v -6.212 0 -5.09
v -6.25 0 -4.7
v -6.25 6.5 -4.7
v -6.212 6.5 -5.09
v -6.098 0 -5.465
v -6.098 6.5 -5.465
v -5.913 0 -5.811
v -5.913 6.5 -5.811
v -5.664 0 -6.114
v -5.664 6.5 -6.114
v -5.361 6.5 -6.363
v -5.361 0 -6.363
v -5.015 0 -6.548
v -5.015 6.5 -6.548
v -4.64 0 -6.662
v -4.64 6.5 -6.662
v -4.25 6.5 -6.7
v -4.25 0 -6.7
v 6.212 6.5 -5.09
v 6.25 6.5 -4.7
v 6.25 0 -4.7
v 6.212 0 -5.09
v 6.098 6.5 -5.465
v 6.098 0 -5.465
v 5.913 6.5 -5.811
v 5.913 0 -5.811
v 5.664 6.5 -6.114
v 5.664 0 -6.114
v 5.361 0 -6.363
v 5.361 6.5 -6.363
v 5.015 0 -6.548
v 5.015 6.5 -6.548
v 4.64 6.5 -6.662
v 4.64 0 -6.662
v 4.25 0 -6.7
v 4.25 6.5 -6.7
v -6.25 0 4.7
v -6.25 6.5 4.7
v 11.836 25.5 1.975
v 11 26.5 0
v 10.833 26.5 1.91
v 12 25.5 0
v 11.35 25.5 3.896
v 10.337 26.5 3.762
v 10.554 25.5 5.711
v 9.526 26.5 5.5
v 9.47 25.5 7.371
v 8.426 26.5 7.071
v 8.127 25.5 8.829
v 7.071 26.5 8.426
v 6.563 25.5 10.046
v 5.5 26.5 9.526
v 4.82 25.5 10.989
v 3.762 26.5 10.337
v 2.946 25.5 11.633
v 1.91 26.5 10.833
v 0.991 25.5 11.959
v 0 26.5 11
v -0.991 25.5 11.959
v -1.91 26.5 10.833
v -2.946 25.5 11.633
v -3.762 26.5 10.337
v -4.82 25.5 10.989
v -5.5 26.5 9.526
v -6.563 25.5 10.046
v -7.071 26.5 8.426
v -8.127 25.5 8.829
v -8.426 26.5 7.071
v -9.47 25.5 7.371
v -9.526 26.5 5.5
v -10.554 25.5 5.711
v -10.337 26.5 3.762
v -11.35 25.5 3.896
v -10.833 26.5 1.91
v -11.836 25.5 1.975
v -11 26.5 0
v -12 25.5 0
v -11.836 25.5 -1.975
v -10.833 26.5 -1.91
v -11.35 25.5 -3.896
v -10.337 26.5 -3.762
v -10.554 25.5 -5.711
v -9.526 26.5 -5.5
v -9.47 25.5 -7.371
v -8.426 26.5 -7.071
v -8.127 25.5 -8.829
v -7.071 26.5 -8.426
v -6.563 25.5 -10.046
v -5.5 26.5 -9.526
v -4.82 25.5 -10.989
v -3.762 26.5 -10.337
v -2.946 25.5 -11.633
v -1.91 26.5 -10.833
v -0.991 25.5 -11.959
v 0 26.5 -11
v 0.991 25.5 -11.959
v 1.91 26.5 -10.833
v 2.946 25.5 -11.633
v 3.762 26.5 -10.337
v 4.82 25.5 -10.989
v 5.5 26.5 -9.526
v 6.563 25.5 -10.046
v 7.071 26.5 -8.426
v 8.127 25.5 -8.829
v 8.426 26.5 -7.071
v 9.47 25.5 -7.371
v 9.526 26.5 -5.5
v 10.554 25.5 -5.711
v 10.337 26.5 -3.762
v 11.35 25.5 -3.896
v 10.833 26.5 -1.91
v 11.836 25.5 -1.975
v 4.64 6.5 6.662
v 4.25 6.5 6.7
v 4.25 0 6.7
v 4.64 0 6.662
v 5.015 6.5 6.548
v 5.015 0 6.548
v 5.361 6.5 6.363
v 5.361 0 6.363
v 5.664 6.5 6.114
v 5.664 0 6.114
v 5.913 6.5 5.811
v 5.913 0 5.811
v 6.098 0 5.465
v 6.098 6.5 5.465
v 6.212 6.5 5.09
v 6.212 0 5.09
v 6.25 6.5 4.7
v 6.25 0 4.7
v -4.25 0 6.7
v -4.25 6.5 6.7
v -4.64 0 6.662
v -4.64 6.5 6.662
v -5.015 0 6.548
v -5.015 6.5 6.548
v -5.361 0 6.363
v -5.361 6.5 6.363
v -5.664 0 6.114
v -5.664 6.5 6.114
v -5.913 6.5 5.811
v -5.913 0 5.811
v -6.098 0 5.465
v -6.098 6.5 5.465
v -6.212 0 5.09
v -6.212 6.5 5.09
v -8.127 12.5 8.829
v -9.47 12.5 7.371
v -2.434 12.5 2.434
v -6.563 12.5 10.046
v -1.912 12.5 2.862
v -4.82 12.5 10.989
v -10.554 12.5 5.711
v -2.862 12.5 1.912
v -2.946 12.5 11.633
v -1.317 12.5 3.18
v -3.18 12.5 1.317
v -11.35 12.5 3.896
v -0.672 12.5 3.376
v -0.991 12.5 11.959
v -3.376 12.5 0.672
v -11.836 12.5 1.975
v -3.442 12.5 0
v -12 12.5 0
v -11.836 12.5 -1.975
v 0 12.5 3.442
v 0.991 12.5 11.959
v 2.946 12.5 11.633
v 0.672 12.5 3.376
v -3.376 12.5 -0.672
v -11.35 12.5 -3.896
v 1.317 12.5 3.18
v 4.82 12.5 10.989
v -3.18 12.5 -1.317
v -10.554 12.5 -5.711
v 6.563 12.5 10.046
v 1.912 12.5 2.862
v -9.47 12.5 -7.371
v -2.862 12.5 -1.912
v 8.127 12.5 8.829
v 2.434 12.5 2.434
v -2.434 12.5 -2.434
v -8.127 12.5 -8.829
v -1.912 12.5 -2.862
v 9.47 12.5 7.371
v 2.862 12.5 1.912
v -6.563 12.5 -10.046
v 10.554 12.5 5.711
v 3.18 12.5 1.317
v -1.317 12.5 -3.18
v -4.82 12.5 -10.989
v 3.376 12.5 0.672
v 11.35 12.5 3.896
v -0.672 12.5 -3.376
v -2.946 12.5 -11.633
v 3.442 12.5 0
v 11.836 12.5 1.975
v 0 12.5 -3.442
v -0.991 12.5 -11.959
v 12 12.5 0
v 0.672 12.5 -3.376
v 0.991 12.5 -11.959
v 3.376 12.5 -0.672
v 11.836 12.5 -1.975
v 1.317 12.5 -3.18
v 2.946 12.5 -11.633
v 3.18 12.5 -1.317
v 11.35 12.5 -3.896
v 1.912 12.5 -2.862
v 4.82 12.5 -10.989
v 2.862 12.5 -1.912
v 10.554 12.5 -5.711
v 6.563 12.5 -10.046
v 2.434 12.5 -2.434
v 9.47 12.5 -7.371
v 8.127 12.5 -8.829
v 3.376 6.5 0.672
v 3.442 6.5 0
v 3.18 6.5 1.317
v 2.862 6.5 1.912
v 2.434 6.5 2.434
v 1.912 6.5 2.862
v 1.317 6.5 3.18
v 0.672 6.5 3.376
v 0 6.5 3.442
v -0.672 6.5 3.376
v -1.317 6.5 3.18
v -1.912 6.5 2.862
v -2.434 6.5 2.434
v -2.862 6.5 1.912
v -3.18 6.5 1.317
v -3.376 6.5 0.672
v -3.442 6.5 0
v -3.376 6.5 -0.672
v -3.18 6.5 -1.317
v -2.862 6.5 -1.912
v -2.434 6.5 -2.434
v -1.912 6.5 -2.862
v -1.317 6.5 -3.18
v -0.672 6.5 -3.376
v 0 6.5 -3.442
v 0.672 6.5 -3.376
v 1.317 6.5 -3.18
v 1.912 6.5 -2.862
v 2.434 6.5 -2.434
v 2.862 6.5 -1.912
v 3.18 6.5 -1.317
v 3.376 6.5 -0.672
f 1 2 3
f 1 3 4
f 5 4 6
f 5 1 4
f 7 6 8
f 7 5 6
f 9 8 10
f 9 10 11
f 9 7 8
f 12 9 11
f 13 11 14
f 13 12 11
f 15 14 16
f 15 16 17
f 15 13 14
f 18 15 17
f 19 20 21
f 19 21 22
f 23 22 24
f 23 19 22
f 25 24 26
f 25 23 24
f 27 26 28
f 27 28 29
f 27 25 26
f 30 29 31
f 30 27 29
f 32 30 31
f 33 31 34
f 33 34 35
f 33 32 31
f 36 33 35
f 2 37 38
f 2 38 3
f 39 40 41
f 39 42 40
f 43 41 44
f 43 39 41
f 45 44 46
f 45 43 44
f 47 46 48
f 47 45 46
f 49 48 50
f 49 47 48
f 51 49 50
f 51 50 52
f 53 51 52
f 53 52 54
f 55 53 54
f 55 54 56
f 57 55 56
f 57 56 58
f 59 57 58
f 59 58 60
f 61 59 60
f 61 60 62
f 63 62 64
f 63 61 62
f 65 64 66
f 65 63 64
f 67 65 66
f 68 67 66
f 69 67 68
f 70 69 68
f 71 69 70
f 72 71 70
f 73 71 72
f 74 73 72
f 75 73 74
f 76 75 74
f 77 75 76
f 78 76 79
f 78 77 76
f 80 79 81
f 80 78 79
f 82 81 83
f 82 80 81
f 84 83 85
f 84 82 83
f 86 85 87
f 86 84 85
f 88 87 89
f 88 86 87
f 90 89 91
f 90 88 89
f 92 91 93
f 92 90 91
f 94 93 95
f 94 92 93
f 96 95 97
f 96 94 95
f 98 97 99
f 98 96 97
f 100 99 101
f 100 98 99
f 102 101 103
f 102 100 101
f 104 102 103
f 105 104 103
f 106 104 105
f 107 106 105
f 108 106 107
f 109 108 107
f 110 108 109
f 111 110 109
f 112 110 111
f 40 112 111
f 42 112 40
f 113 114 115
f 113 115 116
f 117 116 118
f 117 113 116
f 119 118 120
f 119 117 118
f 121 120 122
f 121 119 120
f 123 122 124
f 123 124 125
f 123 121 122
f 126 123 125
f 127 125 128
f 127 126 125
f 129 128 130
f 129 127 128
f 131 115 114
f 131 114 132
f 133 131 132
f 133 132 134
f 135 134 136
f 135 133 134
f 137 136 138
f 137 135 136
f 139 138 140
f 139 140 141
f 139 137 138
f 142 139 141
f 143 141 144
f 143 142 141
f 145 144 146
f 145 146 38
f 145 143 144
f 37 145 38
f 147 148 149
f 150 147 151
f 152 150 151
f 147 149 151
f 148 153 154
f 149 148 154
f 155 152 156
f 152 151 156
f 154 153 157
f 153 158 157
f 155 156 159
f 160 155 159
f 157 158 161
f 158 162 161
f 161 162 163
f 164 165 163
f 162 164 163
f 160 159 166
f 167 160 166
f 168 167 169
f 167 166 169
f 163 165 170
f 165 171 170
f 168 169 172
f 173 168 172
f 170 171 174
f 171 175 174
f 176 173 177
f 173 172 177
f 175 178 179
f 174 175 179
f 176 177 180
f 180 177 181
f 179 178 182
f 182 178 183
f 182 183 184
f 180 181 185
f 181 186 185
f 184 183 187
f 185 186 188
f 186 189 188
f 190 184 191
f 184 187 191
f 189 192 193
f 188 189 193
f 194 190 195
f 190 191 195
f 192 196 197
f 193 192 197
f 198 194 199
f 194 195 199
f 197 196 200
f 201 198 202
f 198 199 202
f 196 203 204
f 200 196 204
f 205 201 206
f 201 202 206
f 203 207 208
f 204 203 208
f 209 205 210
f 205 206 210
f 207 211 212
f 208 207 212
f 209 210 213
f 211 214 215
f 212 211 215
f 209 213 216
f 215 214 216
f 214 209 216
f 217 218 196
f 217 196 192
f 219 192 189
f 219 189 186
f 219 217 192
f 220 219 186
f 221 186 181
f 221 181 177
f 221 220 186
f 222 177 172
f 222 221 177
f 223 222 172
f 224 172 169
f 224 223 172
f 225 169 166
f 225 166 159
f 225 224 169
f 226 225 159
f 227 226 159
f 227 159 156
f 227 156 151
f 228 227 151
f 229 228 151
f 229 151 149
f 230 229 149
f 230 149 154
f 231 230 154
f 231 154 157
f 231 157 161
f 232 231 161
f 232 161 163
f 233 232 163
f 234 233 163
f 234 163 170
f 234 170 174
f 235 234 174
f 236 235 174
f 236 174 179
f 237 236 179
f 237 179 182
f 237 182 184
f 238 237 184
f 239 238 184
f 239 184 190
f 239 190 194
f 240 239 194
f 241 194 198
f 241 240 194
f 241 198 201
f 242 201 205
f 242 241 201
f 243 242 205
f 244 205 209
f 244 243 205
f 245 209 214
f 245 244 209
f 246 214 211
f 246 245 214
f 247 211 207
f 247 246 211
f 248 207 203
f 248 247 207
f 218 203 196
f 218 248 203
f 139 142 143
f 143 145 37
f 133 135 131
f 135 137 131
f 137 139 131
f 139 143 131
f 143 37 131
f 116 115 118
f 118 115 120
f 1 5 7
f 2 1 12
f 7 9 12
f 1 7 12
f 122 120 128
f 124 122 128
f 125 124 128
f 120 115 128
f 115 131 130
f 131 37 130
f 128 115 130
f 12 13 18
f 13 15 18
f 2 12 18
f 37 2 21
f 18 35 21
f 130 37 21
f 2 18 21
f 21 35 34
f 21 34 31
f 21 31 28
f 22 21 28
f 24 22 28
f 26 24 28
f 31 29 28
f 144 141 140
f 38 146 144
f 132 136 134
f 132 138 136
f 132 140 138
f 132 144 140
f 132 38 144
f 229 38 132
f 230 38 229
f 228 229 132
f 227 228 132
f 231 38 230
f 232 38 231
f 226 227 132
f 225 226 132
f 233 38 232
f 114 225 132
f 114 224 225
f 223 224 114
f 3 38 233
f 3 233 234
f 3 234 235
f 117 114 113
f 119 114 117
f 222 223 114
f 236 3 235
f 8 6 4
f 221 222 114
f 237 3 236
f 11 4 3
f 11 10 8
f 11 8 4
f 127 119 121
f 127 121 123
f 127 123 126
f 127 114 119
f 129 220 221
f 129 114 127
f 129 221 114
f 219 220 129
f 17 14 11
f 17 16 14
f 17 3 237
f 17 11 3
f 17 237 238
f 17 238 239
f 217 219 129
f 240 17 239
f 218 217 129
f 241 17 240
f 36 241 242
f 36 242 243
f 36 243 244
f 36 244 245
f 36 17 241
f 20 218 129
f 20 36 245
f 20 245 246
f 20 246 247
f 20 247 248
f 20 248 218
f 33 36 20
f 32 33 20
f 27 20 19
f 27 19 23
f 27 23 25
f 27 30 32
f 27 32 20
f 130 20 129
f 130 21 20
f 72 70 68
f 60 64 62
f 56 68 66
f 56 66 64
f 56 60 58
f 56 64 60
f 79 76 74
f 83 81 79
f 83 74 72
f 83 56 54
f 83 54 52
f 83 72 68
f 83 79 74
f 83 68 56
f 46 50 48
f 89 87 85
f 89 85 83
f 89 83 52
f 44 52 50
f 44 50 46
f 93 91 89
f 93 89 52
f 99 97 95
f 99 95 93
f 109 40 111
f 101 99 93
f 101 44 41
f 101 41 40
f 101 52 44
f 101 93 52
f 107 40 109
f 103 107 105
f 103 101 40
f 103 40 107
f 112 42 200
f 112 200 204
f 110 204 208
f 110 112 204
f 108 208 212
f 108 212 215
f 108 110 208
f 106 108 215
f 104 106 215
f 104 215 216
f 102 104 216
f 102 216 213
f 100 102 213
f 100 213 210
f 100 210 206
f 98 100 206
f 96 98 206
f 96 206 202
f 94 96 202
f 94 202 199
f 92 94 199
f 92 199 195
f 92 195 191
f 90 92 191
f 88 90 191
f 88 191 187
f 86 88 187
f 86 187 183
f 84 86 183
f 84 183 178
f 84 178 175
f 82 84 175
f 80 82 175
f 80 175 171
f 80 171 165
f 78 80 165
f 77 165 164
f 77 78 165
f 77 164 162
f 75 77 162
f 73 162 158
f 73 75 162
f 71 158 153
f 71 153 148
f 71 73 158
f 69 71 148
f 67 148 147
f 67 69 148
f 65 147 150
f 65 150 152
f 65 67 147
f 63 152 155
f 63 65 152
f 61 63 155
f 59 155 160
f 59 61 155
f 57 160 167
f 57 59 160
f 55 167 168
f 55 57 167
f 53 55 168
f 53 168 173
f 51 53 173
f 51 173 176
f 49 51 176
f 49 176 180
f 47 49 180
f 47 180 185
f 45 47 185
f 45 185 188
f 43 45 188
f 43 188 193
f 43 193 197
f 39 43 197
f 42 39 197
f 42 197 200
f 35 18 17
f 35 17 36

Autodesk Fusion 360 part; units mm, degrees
sketch "Sketch1" plane through (0, 0, 0) normal (0, 1, 0) x (1, 0, 0)
  line L0 (6.25, -6.7) -> (-6.25, -6.7)
  line L1 (-6.25, -6.7) -> (-6.25, 6.7)
  line L2 (-6.25, 6.7) -> (6.25, 6.7)
  line L3 (6.25, 6.7) -> (6.25, -6.7)
  line L4 (6.25, -6.7) -> (-6.25, 6.7) construction
  line L5 (-6.25, -6.7) -> (6.25, 6.7) construction
  circle A0 centre (0, 0) radius 3
  circle A1 centre (0, 0) radius 3.5
  line L6 (-2.5, -4.3301) -> (2.5, 4.3301) construction
  line L7 (-2.5, 4.3301) -> (2.5, -4.3301) construction
  line L8 (-5, 0) -> (5, 0) construction
  line L9 (-2.5, -4.3301) -> (2.5, -4.3301)
  line L10 (2.5, -4.3301) -> (5, 0)
  line L11 (5, 0) -> (2.5, 4.3301)
  line L12 (2.5, 4.3301) -> (-2.5, 4.3301)
  line L13 (-2.5, 4.3301) -> (-5, 0)
  line L14 (-5, 0) -> (-2.5, -4.3301)
  circle A2 centre (0, 0) radius 12
  dimension "d1" = 13.4
  dimension "d2" = 12.5
  dimension "d3" = 6
  dimension "d4" = 7
  dimension "d16" = 10
  dimension "d17" = 60
  dimension "d18" = 60
  dimension "d23" = 24
extrude "Extrude1" add sketch "Sketch1" along normal blind 6.5 contours L0 L1 L2 L3 | A0 | A1 | L9 L10 L11 L12 L13 L14
extrude "Extrude2" add sketch "Sketch1" along normal blind 7 from surface at 6.5 contours A0 | A1
thread "Thread1" "ISO Metric profile 7.0 M7x1 6g" major diameter 6.884 minor diameter 5.744 pitch 1 angle 60 resizes the face on face at (3.4826, 11.1667, 0.3485)
extrude "Extrude3" add sketch "Sketch1" along normal blind 13 from surface at 13.5 contours A0
fillet "Fillet1" radius 2 4 edges at (-6.25, 3.25, 6.7) (6.25, 3.25, 6.7) (-6.25, 3.25, -6.7) (6.25, 3.25, -6.7)
extrude "Extrude5" add sketch "Sketch1" against normal blind 14 from surface at 26.5 contours L0 L1 L2 L3 | A0 | A1 | L9 L10 L11 L12 L13 L14 | A2
chamfer "Chamfer1" distance 1 angle 45 1 edges at (-11.1879, 26.5, -4.3394)
